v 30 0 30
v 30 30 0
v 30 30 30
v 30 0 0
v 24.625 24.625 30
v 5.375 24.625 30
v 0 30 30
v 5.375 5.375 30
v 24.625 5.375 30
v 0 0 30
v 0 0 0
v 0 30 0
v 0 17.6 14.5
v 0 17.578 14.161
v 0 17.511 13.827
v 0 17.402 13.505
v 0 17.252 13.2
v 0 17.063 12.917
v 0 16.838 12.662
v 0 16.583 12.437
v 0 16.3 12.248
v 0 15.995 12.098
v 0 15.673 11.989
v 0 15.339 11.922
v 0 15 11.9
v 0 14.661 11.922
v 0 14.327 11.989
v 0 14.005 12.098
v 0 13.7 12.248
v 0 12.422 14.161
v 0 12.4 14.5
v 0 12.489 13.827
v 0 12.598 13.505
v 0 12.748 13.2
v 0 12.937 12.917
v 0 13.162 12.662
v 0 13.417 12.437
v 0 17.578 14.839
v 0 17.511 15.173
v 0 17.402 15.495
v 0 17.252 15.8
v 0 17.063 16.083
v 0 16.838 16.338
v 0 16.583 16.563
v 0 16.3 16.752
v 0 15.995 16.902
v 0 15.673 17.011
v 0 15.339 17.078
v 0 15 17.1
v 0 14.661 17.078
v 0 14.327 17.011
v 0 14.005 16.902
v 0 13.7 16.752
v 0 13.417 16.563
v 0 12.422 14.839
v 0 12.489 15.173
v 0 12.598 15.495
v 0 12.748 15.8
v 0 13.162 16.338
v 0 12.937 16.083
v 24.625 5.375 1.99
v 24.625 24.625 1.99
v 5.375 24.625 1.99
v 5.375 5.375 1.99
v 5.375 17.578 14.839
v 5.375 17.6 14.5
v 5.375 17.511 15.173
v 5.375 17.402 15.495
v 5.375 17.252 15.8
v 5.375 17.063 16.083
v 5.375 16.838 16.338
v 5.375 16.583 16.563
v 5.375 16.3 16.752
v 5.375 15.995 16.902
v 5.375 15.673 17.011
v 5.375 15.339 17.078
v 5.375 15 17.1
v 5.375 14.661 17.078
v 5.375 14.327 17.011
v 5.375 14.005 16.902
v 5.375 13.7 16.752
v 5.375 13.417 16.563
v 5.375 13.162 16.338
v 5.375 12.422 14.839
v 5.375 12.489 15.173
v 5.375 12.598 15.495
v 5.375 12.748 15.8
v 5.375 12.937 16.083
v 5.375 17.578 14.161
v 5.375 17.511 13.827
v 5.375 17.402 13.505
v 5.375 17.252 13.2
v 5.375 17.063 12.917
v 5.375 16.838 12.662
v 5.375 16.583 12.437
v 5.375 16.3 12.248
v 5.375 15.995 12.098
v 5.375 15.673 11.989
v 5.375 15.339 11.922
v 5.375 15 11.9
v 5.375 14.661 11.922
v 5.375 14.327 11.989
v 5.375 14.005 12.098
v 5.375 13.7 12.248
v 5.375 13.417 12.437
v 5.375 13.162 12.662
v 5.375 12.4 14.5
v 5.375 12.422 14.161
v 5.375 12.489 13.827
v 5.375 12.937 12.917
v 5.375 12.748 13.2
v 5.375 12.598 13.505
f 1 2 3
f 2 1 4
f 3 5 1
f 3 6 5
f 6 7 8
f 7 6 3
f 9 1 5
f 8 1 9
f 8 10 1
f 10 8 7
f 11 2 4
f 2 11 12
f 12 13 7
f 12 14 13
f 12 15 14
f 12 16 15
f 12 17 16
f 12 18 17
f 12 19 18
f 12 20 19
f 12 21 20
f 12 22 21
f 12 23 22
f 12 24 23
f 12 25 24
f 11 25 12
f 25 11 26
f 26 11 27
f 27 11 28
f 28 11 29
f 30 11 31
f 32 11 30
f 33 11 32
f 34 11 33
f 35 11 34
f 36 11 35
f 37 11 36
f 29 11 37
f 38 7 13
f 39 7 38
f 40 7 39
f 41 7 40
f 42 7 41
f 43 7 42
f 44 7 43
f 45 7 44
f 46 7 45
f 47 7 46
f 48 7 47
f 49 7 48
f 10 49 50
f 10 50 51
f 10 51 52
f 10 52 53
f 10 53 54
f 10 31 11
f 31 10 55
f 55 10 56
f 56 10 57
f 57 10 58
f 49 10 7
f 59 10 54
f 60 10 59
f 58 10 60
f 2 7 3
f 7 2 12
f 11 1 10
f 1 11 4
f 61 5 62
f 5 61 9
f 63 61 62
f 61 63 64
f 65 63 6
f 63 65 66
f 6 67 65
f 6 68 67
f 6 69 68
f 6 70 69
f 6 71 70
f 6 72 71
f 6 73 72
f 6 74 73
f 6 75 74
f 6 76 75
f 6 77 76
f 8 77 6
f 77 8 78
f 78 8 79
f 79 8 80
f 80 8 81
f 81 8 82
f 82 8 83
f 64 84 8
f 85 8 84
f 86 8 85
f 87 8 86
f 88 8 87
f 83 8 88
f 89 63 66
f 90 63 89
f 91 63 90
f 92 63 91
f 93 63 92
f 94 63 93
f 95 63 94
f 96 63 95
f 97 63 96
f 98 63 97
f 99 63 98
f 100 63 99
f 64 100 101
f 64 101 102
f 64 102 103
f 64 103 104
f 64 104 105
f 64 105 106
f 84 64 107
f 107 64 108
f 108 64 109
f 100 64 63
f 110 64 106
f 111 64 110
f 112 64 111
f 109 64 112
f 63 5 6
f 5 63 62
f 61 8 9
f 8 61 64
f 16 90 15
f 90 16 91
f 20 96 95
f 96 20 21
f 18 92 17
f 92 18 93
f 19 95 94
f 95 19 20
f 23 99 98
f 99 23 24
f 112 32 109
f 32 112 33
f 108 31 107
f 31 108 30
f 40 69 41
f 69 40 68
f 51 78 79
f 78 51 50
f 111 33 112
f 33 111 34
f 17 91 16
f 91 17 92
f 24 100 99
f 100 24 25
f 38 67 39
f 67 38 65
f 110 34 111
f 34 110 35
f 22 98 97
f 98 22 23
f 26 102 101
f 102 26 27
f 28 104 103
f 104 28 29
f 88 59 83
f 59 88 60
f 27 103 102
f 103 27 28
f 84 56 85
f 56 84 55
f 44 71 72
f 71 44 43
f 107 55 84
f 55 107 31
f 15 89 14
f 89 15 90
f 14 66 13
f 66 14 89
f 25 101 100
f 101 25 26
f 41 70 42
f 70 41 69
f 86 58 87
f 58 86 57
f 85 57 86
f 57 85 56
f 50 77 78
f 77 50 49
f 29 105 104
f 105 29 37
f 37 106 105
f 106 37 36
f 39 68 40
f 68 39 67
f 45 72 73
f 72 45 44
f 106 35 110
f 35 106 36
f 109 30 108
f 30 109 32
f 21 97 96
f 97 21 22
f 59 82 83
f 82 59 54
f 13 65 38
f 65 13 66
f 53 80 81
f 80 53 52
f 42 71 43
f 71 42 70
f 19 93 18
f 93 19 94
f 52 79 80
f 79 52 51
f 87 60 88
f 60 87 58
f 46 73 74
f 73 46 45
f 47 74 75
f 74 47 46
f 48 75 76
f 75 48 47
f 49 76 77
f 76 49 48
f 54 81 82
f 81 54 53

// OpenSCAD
// file: params.scad
// adaptive-highchair parameters — all units mm
// Home Depot stock, straight cuts to length, splayed legs. See BOM.md.

/* [Stock — straight cuts to length, see BOM.md] */
TUBE          = 19.05;  // 3/4" square aluminium tube, nominal
TUBE_WALL     = 1.59;   // 1/16" wall
LEG_LEN       = 760;    // cut leg length
RAIL_LEN      = 450;    // cut rail length

/* [Frame — splayed outward] */
BASE_SPAN_X   = 640;    // foot footprint width
BASE_SPAN_Y   = 700;    // foot footprint depth
TOP_SPAN_X    = 400;    // leg spacing at the top
TOP_SPAN_Y    = 460;
SPLAY_X       = asin((BASE_SPAN_Y - TOP_SPAN_Y) / 2 / LEG_LEN);
SPLAY_Y       = asin((BASE_SPAN_X - TOP_SPAN_X) / 2 / LEG_LEN);
FRAME_TOP     = LEG_LEN * cos(SPLAY_X) * cos(SPLAY_Y);

/* [Seat] */
SEAT_W        = 240;
SEAT_D        = 260;
SEAT_T        = 14;
SEAT_H        = 545;   // above floor; 21.5"
SEAT_TILT_DEG = 5;

/* [Back] */
BACK_W        = 240;
BACK_H        = 400;
BACK_T        = 14;
BACK_RECLINE  = 8;

/* [Footrest] */
FOOT_W        = 240;
FOOT_D        = 140;
FOOT_T        = 12;
FOOT_H        = 200;
FOOT_REACH    = 300;

/* [Tray] */
TRAY_W        = 600;
TRAY_D        = 500;
TRAY_T        = 12;
TRAY_H        = 700;
TRAY_NOTCH_W  = 300;
TRAY_NOTCH_D  = 100;

/* [Hardware / strap] */
HARDWARE_D    = 5;     // M5 screws — see BOM.md
CLEAR_HOLE_D  = 5.2;   // M5 clearance; drill only, no tapping
INSERT_L      = 25;    // captive-nut insert length (nut_insert.scad)
STRAP_W       = 25;    // 1" webbing, heat-seal cut ends
STRAP_CLEAR   = 1;

/* [Print] */
$fn           = 48;
CLEARANCE     = 0.4;
// main file
// Drill guide for 3/4" square tube — aligns a hole with the nut insert.
// Slide the tube in until it seats against the end stop, then drill.
// Units mm. See BOM.md and nut_insert.scad.

include <params.scad>

/* [Jig] */
JIG_W      = 30;                    // outer width
JIG_H      = 30;                    // outer height
JIG_L      = 30;                    // outer length
TUBE_OD    = TUBE + 0.2;            // 19.25, clearance on 3/4" tube
STOP_T     = 2;                     // end-stop plate thickness
HOLE_Z     = STOP_T + INSERT_L / 2; // 14.5, matches nut_insert.scad

$fn = 48;

module drill_jig() {
    difference() {
        cube([JIG_W, JIG_H, JIG_L], center = false);

        // Tube passage, from stop plate to open end.
        translate([JIG_W / 2 - TUBE_OD / 2, JIG_H / 2 - TUBE_OD / 2, STOP_T - 0.01])
            cube([TUBE_OD, TUBE_OD, JIG_L - STOP_T + 0.02], center = false);

        // Drill guide hole, perpendicular to the tube.
        translate([0, JIG_H / 2, HOLE_Z])
            rotate([0, 90, 0])
                cylinder(h = JIG_W + 2, r = CLEAR_HOLE_D / 2, center = true);
    }
}

drill_jig();
